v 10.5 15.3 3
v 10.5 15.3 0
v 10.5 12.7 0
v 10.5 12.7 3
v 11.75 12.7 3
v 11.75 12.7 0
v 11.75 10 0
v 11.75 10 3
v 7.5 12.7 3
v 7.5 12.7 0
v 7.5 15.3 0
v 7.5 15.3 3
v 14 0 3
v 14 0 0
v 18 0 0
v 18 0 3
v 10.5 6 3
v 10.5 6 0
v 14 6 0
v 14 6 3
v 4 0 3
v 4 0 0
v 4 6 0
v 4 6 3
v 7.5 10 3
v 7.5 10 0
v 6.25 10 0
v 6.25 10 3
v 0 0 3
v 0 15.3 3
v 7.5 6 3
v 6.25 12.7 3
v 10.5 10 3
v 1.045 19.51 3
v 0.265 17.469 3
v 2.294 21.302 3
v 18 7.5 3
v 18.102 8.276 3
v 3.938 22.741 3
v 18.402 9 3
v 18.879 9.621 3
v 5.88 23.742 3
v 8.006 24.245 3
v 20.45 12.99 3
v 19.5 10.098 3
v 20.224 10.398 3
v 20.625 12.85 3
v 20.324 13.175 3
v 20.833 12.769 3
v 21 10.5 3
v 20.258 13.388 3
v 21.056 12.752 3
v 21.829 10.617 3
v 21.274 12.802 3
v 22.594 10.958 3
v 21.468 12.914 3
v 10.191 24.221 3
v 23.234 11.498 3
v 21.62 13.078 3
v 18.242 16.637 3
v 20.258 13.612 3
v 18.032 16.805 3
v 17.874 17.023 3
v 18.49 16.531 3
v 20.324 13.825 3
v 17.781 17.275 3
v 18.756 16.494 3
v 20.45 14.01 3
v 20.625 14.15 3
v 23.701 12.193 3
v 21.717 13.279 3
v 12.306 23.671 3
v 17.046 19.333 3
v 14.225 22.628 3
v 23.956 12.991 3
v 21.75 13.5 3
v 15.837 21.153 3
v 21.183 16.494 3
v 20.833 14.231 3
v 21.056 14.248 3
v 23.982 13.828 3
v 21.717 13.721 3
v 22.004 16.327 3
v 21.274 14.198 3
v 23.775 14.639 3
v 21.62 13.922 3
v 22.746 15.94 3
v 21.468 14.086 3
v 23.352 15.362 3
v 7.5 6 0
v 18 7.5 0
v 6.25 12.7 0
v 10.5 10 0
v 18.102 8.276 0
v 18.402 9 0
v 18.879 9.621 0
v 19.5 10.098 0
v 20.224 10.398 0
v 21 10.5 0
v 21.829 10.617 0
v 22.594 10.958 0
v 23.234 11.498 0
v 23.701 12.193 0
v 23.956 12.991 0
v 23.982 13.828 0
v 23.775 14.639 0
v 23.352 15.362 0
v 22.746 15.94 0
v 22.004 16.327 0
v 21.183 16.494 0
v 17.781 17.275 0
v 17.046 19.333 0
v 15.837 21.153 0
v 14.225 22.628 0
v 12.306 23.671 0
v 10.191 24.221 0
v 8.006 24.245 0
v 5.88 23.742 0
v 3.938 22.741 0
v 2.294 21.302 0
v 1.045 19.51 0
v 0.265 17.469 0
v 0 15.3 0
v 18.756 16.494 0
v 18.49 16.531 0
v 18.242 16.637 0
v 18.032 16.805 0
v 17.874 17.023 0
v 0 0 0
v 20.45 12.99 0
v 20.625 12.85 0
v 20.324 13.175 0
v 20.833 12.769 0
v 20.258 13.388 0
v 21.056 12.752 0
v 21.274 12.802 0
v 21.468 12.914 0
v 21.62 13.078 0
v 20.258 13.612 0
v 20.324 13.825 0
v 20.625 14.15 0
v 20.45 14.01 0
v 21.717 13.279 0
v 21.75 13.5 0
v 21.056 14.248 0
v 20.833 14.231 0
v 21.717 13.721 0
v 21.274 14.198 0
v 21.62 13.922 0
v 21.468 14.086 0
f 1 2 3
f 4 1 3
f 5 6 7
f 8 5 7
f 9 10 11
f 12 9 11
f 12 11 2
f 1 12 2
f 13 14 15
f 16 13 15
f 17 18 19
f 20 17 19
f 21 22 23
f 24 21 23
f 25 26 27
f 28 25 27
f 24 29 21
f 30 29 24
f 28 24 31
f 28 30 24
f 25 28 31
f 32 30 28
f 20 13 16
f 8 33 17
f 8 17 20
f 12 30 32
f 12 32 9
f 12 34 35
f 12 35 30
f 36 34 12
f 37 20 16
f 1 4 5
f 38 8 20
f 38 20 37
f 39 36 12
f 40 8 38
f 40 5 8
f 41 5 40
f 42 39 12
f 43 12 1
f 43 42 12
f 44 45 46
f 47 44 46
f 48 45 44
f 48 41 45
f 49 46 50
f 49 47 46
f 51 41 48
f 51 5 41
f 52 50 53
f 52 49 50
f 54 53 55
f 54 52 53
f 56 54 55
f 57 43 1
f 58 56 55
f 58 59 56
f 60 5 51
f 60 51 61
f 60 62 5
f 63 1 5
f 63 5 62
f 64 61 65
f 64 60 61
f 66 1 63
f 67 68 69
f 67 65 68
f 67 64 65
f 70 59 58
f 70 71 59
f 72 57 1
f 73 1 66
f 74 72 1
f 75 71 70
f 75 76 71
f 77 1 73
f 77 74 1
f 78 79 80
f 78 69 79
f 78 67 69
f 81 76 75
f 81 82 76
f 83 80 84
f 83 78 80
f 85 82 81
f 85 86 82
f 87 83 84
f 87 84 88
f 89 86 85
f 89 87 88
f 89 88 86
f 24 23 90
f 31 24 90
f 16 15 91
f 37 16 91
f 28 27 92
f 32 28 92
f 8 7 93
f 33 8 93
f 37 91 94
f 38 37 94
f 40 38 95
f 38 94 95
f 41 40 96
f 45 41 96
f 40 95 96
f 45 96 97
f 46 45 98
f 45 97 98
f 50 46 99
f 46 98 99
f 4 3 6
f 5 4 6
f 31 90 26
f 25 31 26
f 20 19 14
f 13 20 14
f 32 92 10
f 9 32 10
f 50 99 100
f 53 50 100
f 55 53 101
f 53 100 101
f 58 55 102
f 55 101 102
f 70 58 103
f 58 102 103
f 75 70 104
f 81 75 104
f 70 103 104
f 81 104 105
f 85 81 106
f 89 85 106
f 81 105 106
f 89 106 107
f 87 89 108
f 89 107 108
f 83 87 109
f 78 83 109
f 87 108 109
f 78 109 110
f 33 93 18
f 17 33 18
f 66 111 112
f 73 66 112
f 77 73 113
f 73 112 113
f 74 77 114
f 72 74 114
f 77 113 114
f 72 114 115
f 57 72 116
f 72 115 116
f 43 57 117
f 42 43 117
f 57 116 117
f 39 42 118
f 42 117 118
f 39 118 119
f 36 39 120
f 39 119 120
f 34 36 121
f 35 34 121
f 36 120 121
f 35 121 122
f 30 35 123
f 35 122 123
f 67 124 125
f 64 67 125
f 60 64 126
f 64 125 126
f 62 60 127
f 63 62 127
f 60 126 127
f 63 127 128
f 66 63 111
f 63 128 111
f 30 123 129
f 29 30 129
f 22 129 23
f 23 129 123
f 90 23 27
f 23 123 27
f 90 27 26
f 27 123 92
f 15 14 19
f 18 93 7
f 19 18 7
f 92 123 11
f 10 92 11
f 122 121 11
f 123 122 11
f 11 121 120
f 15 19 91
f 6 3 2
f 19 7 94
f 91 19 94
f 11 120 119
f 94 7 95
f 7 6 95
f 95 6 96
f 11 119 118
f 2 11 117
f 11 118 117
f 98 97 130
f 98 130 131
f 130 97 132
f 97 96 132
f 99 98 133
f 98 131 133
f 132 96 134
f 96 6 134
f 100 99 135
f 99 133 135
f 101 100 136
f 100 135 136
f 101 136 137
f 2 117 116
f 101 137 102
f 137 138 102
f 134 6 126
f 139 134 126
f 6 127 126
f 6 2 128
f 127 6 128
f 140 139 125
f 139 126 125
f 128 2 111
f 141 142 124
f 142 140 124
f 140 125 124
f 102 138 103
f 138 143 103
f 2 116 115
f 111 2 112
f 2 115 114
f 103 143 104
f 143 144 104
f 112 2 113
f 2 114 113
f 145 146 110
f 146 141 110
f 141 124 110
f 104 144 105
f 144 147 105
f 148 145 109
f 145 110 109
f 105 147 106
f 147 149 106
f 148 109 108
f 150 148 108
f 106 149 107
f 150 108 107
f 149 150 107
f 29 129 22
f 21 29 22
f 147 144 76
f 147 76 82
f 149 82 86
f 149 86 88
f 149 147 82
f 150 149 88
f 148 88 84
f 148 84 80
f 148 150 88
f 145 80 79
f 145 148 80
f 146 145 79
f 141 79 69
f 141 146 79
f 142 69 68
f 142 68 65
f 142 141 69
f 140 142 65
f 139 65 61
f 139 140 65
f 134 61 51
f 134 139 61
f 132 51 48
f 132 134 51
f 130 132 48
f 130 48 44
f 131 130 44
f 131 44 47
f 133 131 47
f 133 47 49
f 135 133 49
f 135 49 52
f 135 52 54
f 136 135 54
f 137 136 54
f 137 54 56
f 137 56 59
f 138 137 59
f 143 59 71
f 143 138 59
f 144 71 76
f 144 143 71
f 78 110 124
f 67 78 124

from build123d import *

# Parameters (mm, degrees)
SKETCH_1_R      = 0.75
EXTRUDE_1_DEPTH = 3


with BuildPart() as part:
    # 草图1 → 凸台-拉伸1 (new body)
    with BuildSketch(Plane.XY):
        with BuildLine():
            Line((0, 0), (4, 0))
            Line((4, 0), (4, 6))
            Line((4, 6), (7.5, 6))
            Line((7.5, 6), (7.5, 10))
            Line((7.5, 10), (6.25, 10))
            Line((6.25, 10), (6.25, 12.7))
            Line((6.25, 12.7), (7.5, 12.7))
            Line((7.5, 12.7), (7.5, 15.3))
            Line((7.5, 15.3), (10.5, 15.3))
            Line((10.5, 15.3), (10.5, 12.7))
            Line((10.5, 12.7), (11.75, 12.7))
            Line((11.75, 12.7), (11.75, 10))
            Line((11.75, 10), (10.5, 10))
            Line((10.5, 10), (10.5, 6))
            Line((10.5, 6), (14, 6))
            Line((14, 6), (14, 0))
            Line((14, 0), (18, 0))
            Line((18, 0), (18, 7.5))
            ThreePointArc((18, 7.5), (18.878679656, 9.621320344), (21, 10.5))
            ThreePointArc((21, 10.5), (23.998598833, 13.408321005), (21.183272352, 16.494396641))
            Line((21.183272352, 16.494396641), (18.756260727, 16.494396641))
            ThreePointArc((18.756260727, 16.494396641), (18.131536654, 16.713551053), (17.780634655, 17.274956977))
            ThreePointArc((17.780634655, 17.274956977), (8.006448766, 24.24499055), (0, 15.3))
            Line((0, 15.3), (0, 0))
        make_face()
        with Locations((21, 13.5)):
            Circle(SKETCH_1_R, mode=Mode.SUBTRACT)
    extrude(amount=EXTRUDE_1_DEPTH)


solid = part.part
